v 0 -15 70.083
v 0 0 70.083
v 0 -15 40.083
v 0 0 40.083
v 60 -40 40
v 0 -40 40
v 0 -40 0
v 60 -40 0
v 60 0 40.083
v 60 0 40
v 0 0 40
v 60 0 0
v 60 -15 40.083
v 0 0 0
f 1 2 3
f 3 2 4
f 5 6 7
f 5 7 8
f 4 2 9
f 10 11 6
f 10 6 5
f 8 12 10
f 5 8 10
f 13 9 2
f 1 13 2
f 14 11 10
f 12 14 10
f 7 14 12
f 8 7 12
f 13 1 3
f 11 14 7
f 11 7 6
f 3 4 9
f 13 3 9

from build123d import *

# Parameters (mm, degrees)
F0_W     = 60
F0_H     = 40
F1_DEPTH = 40
F4_DEPTH = 15


with BuildPart() as f1:
    # F0 (on Front) → F1 (new body)
    with BuildSketch(Plane.XZ):
        with Locations((30, 20)):
            Rectangle(F0_W, F0_H)
    extrude(amount=F1_DEPTH)


with BuildPart() as f4:
    # F3 (on Front) → F4 (new body)
    with BuildSketch(Plane.XZ):
        Polygon((0, 70.083185), (0, 40.083185), (60, 40.083185), align=None)
    extrude(amount=F4_DEPTH)


solid = Compound([f1.part, f4.part])
